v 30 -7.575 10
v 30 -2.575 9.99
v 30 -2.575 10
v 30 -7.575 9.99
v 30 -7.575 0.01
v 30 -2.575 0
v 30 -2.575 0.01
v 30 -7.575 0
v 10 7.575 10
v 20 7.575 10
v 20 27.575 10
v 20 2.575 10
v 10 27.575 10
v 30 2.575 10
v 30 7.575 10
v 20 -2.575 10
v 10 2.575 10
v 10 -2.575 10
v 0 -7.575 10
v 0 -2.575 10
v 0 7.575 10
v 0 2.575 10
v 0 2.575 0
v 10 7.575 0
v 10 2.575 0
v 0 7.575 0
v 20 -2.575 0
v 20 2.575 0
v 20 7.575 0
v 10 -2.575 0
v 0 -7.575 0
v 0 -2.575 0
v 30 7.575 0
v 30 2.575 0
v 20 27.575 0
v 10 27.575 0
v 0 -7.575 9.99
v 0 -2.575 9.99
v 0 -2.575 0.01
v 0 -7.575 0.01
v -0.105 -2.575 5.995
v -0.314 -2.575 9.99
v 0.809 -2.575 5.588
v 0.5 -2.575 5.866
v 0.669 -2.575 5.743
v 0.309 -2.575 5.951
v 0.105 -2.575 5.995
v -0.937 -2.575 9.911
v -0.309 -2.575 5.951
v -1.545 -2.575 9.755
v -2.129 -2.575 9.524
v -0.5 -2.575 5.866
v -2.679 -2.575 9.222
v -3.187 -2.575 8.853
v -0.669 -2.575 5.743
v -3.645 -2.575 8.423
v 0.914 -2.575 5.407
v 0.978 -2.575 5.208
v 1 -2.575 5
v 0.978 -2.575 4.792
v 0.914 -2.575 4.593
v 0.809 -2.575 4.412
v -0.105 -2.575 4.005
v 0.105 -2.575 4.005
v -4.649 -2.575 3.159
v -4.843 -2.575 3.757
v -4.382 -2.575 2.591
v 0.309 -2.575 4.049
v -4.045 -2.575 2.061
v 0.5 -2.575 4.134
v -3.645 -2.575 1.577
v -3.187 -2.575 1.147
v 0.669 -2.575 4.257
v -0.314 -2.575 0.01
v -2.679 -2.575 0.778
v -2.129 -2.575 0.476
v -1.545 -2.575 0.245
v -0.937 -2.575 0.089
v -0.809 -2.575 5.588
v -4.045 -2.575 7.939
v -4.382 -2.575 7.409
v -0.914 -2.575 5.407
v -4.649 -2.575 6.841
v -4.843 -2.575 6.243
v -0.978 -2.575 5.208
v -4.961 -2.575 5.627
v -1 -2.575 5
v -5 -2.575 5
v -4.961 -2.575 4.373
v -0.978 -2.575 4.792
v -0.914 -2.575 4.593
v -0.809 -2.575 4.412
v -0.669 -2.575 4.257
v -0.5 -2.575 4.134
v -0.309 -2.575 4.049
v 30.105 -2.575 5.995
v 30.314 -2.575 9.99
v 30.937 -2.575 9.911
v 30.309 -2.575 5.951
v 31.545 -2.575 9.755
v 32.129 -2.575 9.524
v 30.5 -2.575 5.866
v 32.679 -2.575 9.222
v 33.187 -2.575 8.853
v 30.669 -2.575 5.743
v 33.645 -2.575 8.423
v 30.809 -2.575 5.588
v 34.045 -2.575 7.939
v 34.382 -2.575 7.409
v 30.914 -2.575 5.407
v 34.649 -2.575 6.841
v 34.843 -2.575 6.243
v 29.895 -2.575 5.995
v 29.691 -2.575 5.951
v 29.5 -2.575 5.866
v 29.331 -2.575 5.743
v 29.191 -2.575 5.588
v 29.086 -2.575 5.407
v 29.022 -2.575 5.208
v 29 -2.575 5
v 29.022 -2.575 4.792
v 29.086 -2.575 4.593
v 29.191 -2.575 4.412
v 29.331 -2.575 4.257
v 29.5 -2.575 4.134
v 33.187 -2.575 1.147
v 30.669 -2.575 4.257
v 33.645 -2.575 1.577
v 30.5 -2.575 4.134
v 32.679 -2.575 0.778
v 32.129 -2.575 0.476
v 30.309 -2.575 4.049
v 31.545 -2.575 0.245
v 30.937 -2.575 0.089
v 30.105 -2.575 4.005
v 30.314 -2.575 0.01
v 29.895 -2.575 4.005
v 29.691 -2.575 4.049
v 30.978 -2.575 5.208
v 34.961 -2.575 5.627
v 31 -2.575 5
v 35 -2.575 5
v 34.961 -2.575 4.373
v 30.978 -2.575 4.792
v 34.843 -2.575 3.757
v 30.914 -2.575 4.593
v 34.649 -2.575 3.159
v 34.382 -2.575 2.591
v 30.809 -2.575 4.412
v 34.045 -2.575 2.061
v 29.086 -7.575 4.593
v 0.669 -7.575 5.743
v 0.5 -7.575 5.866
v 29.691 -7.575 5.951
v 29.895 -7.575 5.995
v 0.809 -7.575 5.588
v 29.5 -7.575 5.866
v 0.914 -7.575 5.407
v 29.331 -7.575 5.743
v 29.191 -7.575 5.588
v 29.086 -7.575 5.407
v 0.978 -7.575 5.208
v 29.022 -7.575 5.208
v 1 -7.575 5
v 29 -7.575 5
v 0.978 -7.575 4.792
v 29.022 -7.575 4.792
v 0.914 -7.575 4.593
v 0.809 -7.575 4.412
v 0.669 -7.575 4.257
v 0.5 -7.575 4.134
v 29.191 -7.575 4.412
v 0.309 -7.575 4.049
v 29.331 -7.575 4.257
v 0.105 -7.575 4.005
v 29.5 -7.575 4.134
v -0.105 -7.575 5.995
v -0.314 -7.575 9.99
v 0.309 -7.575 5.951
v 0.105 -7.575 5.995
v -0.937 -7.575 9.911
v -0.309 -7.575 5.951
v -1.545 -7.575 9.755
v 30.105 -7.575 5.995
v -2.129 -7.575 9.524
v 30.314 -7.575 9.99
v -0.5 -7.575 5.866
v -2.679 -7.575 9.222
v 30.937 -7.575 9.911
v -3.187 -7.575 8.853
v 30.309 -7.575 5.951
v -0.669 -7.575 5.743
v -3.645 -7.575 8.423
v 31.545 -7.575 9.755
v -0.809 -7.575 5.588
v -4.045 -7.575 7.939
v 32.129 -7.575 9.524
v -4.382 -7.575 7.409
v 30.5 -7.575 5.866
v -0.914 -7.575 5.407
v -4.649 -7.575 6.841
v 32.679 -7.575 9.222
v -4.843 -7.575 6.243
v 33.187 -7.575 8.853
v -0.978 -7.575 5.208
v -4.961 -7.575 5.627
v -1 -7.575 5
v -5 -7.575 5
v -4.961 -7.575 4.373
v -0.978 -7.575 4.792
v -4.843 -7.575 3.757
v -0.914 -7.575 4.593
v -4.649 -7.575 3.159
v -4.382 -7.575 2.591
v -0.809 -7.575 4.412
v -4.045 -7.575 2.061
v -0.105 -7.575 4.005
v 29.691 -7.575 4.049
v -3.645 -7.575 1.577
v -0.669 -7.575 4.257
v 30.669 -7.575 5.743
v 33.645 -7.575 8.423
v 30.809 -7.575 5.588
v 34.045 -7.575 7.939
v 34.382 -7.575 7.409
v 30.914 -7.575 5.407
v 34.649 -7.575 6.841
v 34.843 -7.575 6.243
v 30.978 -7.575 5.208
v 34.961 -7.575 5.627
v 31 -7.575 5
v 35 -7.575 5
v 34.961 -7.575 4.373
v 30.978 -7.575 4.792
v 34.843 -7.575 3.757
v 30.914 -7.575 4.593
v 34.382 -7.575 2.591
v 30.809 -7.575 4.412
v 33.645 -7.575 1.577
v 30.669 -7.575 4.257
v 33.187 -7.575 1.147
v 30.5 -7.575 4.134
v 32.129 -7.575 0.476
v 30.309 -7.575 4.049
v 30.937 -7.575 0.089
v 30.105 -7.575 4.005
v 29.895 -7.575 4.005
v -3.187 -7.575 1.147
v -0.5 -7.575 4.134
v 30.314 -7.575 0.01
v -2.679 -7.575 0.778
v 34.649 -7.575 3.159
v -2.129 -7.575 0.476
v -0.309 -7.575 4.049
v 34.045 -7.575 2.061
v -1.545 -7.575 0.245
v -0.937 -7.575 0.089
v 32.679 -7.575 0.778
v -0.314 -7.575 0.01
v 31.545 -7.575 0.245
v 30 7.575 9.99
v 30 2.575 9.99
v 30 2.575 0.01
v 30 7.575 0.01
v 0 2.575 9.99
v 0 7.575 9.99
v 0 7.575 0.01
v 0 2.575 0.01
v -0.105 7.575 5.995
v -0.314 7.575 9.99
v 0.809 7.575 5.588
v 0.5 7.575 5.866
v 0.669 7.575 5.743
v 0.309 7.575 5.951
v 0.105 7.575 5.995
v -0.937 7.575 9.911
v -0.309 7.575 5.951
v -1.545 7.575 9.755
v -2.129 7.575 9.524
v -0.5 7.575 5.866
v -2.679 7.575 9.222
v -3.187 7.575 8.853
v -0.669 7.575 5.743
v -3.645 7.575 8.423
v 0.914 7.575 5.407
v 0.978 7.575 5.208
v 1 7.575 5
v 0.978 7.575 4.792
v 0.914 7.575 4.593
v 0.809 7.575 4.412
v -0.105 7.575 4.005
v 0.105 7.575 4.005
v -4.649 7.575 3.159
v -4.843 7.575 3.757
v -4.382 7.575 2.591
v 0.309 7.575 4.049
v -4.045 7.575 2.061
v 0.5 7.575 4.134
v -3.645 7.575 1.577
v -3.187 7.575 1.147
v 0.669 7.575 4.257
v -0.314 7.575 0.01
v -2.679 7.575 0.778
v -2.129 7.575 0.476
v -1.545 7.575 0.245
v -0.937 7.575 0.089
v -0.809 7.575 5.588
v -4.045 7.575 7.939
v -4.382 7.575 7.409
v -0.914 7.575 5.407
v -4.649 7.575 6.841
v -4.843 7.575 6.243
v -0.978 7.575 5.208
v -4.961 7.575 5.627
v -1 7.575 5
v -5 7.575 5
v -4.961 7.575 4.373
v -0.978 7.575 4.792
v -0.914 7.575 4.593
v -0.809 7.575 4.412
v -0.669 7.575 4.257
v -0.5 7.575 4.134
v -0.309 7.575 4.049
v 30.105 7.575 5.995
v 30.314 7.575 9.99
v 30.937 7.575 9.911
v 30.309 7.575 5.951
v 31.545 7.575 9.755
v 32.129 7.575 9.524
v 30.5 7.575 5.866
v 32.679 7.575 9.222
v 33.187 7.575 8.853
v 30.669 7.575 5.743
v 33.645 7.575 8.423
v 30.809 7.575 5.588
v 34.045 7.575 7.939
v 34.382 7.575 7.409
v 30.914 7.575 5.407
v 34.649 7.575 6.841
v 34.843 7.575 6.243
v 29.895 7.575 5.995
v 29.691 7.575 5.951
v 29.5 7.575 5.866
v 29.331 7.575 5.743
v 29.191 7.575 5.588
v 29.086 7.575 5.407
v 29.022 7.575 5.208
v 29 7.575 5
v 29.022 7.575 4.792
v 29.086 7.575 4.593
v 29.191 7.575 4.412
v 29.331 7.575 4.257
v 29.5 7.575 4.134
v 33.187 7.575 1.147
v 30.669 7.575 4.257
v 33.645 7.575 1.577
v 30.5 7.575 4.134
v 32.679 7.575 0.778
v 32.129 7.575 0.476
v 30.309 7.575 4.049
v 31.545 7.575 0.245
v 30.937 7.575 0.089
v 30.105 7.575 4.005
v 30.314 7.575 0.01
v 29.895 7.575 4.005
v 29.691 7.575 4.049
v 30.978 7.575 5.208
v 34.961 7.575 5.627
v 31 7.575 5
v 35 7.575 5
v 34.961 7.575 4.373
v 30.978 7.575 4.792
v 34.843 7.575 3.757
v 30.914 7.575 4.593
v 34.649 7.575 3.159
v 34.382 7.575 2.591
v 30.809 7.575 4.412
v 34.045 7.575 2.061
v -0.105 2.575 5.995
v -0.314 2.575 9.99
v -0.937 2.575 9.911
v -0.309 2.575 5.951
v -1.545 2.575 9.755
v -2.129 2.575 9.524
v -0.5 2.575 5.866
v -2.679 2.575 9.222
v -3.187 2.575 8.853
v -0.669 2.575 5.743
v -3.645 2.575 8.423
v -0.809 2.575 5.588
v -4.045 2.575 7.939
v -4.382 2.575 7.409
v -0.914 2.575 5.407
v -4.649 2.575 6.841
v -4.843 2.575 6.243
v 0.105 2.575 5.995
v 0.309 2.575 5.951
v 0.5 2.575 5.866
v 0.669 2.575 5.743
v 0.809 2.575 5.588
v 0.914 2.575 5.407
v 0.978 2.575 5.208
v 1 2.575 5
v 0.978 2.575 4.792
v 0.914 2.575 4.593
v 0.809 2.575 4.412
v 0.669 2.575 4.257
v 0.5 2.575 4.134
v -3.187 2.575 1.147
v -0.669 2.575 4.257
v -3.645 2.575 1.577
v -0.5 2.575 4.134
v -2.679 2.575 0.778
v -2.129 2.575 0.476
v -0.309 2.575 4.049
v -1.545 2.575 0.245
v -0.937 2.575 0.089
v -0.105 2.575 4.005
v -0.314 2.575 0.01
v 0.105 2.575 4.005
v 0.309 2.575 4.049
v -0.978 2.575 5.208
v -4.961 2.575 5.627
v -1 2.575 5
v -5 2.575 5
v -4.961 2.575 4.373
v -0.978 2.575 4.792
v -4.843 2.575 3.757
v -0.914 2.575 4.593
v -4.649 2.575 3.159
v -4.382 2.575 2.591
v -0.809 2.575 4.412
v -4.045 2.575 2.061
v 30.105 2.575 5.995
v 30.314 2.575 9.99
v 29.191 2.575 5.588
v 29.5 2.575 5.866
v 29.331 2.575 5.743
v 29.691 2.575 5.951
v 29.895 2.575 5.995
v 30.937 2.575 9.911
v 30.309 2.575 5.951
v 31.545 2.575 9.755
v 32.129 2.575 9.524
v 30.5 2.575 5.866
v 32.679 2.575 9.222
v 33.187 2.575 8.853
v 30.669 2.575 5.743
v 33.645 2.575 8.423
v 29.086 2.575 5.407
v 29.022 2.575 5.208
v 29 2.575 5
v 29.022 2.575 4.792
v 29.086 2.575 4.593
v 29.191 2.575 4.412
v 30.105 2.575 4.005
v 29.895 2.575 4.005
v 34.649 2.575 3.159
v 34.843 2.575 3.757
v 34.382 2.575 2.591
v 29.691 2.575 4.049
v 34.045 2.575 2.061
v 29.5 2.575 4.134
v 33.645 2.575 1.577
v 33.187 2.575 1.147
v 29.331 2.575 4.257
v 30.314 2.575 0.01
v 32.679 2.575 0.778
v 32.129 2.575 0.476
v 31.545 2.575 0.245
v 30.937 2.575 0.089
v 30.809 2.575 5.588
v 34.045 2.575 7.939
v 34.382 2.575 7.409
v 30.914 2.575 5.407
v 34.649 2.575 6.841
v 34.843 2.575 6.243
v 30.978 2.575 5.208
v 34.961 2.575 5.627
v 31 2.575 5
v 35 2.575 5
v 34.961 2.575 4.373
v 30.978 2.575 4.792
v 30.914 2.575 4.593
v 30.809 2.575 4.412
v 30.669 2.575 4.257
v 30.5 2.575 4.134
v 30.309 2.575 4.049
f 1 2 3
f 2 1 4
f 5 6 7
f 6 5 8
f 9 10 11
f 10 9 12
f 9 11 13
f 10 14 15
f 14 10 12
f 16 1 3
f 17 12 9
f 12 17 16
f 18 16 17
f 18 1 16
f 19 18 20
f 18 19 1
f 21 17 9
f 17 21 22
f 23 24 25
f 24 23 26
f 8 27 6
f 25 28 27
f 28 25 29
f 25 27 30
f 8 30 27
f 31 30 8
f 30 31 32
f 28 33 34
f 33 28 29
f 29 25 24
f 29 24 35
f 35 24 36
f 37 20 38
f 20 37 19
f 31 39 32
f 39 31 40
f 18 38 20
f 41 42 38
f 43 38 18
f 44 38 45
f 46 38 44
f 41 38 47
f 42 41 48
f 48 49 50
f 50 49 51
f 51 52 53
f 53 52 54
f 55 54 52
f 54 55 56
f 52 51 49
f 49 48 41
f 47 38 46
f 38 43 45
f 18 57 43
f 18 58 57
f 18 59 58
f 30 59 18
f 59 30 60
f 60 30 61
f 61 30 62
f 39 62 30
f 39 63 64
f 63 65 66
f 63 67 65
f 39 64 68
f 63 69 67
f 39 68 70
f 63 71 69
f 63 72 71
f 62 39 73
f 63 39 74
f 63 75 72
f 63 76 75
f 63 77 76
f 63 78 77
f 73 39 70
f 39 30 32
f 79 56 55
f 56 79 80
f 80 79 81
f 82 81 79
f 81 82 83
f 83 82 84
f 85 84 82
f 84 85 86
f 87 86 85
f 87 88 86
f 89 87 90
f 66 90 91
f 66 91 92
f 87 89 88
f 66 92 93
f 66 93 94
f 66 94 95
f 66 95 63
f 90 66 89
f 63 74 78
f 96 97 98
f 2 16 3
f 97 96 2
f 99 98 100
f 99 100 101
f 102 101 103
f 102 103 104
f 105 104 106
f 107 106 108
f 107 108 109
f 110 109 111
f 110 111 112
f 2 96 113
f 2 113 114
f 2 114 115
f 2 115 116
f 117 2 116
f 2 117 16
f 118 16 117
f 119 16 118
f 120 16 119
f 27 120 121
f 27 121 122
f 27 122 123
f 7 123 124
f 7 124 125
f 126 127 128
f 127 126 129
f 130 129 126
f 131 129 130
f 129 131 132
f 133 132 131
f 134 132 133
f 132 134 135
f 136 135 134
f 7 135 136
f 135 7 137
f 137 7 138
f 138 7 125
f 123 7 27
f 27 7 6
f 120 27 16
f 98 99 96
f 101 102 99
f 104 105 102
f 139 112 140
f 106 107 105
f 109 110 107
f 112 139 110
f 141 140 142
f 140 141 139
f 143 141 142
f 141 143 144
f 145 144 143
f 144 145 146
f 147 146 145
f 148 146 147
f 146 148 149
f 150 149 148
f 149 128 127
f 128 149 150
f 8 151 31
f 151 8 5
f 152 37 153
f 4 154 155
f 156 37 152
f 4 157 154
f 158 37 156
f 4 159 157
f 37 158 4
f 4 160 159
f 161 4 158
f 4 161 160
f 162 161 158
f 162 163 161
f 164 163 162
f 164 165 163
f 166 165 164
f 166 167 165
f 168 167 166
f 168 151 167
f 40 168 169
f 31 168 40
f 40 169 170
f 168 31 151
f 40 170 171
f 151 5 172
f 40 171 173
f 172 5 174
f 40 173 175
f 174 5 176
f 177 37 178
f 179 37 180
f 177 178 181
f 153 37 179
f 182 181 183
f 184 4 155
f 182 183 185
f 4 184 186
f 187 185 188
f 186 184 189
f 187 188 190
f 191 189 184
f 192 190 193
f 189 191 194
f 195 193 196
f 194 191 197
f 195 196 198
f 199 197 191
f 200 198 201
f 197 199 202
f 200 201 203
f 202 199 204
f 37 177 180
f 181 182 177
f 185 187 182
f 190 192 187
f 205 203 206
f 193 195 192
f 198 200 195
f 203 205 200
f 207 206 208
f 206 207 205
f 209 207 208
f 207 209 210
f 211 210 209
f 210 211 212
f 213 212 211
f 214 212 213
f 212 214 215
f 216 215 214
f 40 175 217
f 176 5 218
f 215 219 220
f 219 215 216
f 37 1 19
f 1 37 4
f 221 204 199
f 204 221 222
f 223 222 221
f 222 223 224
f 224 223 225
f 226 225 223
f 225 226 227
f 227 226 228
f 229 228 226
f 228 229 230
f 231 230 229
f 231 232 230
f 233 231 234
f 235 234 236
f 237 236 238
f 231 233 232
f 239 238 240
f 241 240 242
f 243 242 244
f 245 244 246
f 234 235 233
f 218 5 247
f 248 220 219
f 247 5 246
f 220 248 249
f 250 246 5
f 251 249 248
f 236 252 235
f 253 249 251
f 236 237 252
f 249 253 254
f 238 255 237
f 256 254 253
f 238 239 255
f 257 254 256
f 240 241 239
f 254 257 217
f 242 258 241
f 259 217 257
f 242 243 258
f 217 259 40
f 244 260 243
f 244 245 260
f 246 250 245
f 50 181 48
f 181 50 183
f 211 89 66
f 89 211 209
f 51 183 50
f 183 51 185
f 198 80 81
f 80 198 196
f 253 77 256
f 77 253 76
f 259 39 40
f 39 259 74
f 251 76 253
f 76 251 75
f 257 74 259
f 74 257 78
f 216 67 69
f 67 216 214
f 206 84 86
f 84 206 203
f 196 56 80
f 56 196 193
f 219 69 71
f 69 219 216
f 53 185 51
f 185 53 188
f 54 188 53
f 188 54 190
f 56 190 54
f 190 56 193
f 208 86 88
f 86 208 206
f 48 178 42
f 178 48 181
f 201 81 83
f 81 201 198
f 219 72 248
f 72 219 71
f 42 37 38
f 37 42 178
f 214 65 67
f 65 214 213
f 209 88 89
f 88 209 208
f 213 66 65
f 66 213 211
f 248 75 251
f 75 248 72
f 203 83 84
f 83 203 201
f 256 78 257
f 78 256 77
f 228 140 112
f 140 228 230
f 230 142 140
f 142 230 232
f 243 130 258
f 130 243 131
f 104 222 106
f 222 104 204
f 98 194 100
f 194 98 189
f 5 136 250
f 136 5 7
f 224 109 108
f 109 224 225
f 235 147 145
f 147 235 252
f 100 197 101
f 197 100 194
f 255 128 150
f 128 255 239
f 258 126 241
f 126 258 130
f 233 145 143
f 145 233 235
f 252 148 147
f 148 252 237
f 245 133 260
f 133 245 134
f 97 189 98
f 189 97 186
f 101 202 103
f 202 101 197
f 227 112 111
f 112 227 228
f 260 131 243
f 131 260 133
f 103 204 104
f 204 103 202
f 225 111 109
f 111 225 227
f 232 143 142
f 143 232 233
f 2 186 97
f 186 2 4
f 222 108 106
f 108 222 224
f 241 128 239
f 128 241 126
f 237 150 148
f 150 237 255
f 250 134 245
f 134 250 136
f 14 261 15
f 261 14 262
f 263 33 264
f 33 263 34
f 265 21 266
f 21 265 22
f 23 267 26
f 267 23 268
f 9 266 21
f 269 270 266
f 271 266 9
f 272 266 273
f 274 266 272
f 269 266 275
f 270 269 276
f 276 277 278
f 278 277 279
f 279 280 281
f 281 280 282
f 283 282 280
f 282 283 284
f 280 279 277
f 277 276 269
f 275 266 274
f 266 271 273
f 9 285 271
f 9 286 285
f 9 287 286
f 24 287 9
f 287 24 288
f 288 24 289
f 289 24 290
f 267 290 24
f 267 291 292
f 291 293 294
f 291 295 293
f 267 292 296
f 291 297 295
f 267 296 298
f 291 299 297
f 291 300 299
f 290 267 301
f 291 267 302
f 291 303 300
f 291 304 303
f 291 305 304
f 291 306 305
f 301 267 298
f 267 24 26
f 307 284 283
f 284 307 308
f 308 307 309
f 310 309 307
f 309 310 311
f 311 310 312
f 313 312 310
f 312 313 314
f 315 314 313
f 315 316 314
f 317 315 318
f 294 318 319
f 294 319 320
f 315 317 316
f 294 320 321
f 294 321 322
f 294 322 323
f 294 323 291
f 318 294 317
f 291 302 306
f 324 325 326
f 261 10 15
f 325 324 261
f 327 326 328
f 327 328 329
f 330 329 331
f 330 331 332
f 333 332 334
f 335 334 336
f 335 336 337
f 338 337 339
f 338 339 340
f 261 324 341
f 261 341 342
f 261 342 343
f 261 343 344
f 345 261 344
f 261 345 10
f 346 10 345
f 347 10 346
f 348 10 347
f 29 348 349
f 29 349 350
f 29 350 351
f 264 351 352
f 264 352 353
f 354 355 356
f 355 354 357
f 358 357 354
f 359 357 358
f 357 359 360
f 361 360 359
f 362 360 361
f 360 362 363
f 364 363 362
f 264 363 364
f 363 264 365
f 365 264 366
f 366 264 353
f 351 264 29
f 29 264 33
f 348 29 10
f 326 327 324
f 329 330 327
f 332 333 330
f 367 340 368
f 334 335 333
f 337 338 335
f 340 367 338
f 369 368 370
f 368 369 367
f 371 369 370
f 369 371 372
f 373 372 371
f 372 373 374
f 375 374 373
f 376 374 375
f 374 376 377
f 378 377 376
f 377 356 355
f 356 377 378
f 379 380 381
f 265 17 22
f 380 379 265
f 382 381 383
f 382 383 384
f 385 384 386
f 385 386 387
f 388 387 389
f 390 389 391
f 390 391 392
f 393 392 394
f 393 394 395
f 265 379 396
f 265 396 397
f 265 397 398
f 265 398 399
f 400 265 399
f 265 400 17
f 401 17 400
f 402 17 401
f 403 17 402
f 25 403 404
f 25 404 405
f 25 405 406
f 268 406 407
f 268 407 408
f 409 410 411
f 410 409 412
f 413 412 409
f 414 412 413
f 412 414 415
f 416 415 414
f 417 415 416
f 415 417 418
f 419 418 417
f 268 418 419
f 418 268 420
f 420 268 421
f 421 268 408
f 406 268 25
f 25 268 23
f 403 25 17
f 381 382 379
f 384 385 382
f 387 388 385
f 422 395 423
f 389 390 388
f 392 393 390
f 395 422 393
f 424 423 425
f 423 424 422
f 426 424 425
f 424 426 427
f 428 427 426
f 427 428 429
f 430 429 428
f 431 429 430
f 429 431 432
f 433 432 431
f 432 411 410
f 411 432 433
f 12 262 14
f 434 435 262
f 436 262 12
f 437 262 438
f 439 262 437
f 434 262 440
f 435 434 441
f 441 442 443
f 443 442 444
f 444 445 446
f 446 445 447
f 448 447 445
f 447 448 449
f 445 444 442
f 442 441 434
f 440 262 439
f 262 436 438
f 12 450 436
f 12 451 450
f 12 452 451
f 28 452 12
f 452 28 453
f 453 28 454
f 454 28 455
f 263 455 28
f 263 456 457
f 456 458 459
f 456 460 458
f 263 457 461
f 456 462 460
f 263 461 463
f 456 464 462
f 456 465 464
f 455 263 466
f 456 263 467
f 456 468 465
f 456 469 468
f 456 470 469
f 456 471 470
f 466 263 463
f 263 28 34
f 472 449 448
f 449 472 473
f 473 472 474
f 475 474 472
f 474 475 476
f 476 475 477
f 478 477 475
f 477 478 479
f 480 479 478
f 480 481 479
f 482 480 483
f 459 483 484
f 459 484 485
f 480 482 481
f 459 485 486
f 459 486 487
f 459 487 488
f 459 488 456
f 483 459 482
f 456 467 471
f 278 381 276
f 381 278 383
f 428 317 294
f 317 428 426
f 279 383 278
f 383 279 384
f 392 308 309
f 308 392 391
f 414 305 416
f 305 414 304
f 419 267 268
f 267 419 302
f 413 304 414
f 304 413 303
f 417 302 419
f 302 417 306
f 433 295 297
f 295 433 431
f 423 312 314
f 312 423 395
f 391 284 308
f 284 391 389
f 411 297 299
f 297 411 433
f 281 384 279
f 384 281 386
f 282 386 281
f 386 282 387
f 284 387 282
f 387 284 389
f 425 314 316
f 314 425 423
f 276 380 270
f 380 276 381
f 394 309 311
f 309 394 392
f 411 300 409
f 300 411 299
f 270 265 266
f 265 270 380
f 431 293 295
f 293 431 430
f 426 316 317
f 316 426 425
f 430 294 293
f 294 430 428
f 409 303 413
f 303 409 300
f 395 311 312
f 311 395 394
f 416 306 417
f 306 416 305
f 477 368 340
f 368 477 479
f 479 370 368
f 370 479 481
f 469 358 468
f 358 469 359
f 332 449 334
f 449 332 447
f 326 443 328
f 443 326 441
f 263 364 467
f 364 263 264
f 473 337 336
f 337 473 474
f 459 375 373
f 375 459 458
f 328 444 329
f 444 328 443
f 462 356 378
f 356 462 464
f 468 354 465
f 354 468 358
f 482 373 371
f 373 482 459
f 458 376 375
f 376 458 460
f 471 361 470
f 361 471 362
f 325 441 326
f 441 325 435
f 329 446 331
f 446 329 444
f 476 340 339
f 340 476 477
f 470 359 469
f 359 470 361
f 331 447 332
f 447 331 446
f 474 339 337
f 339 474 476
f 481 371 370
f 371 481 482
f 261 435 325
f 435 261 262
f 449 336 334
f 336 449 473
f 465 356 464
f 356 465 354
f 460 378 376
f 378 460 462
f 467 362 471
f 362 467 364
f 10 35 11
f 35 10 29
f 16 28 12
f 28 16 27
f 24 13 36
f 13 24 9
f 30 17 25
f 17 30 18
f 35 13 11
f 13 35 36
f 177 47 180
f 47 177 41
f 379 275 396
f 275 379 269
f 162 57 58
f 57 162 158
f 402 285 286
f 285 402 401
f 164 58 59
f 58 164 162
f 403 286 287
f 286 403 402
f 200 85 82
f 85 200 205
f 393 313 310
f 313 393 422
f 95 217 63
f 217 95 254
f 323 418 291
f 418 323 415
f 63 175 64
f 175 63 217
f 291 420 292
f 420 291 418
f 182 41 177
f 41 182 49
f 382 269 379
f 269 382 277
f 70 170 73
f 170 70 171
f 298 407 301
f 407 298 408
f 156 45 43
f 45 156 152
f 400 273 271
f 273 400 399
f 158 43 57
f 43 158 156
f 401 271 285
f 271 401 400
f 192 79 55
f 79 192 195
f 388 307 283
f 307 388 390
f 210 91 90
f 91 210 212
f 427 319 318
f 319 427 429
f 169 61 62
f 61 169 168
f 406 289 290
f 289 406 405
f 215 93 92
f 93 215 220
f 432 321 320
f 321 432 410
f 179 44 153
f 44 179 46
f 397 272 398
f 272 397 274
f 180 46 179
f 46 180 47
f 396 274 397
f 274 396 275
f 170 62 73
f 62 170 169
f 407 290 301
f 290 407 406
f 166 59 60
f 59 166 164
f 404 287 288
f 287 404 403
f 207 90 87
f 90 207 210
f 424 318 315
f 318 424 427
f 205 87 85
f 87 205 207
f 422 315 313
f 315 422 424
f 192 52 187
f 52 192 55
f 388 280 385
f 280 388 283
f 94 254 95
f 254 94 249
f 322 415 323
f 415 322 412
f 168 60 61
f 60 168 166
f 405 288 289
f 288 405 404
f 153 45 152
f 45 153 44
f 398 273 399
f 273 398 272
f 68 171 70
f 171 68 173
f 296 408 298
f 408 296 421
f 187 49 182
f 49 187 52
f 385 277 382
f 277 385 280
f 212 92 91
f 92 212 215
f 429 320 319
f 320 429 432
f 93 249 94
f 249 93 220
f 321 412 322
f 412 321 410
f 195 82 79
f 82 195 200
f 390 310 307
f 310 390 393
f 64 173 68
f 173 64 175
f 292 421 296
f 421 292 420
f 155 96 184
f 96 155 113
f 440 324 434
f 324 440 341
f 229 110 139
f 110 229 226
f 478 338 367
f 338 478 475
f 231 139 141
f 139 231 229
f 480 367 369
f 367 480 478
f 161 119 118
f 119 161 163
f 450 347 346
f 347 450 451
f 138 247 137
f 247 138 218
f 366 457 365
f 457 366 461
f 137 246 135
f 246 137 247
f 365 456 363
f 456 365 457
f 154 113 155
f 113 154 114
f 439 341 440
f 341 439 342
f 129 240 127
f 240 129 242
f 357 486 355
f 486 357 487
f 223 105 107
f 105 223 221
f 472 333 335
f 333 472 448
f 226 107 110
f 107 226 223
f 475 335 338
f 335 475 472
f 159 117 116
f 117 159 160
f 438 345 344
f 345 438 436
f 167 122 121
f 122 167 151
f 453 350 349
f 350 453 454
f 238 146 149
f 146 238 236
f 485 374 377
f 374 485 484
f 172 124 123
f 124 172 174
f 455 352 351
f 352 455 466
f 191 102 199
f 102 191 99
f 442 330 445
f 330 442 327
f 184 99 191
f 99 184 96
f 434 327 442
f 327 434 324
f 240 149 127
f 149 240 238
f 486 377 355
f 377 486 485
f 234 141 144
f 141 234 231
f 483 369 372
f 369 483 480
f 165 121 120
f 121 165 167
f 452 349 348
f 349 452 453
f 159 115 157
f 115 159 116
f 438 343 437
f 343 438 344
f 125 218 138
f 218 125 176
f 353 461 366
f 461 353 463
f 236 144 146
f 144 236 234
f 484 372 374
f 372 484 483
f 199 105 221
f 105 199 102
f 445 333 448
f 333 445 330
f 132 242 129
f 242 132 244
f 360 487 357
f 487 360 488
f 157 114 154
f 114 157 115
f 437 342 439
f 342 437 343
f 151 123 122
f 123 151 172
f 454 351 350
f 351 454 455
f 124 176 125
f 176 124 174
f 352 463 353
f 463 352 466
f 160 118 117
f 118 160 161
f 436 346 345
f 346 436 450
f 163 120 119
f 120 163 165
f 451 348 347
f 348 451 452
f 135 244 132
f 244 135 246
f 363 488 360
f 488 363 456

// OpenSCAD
//arm to hold the idler suspension arms. two hinges on either side and a means of attaching to the chassis

//looking from the top down it is an H

//tracks ahve a gap of 0.145 between plastic that rubs together
gap=0.15;
suspensionArmThick = 5;

gapWidth = suspensionArmThick  + gap;

armThick=5;
armHeight=10;

//how much space between the axle of the idler and anything else
idlerRadiusAllowance = 8.73 + 2;
hingeRadiusAllowance = armHeight;


//distance between hingle axle and idler axle
armLength= hingeRadiusAllowance*2 + armHeight;

//hingeArmLength=10;

//same as idler?
axleRadius = 1;

springArmOffset = 5;

distanceFromChassis=20;


difference(){

	union(){
		//arm between hinge and idler wheel

		translate([0,-armThick-gapWidth/2,0]) cube([armLength,armThick,armHeight]);

		translate([0,-gapWidth/2,armHeight/2]) rotate([90,0,0]) cylinder(r=armHeight/2, h= armThick, $fn = 50);
		
		translate([armLength,-gapWidth/2,armHeight/2]) rotate([90,0,0]) cylinder(r=armHeight/2, h= armThick, $fn = 50);
		
		translate([0,gapWidth/2,0]) cube([armLength,armThick,armHeight]);

		translate([0,armThick + gapWidth/2,armHeight/2]) rotate([90,0,0]) cylinder(r=armHeight/2, h= armThick, $fn = 50);
		
		translate([armLength,armThick + gapWidth/2,armHeight/2]) rotate([90,0,0]) cylinder(r=armHeight/2, h= armThick, $fn = 50);


		translate([hingeRadiusAllowance,-gapWidth/2,0 ]) cube([armHeight,distanceFromChassis+gapWidth+armThick,armHeight]);
	//translate([-armThick/2 + springArmOffset,-armThick/2,armThick])cube([armThick,armThick,hingeArmLength]);
	
	}

	//hinge hole
	translate([0,20,armHeight/2]) rotate([90,0,0]) cylinder(r=axleRadius, h= 60, $fn = 30);
	
	//idler axle hole
	translate([armLength ,40 ,armHeight/2]) rotate([90,0,0]) cylinder(r=axleRadius, h= 80, $fn = 30);

}
